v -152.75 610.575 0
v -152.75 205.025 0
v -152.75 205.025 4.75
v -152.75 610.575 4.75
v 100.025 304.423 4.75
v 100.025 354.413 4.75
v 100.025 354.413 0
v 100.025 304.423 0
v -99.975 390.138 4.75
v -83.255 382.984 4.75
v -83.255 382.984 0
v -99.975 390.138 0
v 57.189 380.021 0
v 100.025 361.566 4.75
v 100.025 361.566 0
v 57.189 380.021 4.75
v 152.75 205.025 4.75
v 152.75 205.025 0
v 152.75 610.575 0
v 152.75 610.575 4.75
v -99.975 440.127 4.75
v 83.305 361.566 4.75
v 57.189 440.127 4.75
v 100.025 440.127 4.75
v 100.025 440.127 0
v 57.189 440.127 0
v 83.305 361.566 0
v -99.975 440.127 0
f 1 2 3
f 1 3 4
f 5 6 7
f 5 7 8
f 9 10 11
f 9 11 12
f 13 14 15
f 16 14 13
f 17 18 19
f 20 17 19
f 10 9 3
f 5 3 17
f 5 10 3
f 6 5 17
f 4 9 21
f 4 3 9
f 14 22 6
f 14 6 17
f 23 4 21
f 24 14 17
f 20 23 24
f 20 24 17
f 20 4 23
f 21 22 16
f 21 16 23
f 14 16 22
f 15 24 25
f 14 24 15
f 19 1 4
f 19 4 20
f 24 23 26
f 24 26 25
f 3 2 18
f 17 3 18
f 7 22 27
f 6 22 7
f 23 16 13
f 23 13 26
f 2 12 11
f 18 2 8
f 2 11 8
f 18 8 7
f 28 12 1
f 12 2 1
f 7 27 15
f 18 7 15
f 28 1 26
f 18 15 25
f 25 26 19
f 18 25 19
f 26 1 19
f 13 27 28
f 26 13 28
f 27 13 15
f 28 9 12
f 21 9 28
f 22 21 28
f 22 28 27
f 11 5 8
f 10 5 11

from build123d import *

# Parameters (mm, degrees)
SKETCH_1_W                     = 305.5
SKETCH_1_H                     = 1221.15
EXTRUDE_1_DEPTH                = 4.75
CUT_EXTRUDE_2_DEPTH            = 4.75
SPLIT_BODIES_1_SURFACE_1_BACK  = 1259.793
SPLIT_BODIES_1_SURFACE_1_DEPTH = 2519.586


with BuildPart() as part:
    # 草圖1 → 填料-伸長1 (new body)
    with BuildSketch(Plane.XY):
        Rectangle(SKETCH_1_W, SKETCH_1_H)
    extrude(amount=EXTRUDE_1_DEPTH)

    # 草圖2 → 除料-伸長2 (cut)
    with BuildSketch(Plane.XY.offset(4.75)):
        Polygon((100.025, 354.412698413), (100.025, 304.423280423), (-83.25542328, 382.984126984), (-99.975, 390.137566138), (-99.975, 440.126984127), (83.30542328, 361.566137566), align=None)
        Polygon((57.189021164, 380.021164021), (57.189021164, 440.126984127), (100.025, 440.126984127), (100.025, 361.566137566), align=None)
        Polygon((50.035582011, 106.53968254), (57.189021164, 106.53968254), (57.189021164, 120.846560847), (100.025, 120.846560847), (100.025, 84.994708995), (71.453571429, 56.55026455), (50.035582011, 56.55026455), align=None)
        Polygon((-71.403571429, 56.55026455), (-99.975, 84.994708995), (-99.975, 120.846560847), (-57.096693122, 120.846560847), (-57.096693122, 106.53968254), (-21.414153439, 106.53968254), (-21.414153439, 120.846560847), (21.464153439, 120.846560847), (21.464153439, 85.121693122), (-7.107275132, 56.55026455), align=None)
        Polygon((-21.414153439, 142.264550265), (-57.096693122, 142.264550265), (-57.096693122, 127.830687831), (-99.975, 128), (-99.975, 163.682539683), (-71.403571429, 192.423280423), (71.453571429, 192.253968254), (100.025, 163.682539683), (100.025, 127.830687831), (57.189021164, 127.830687831), (57.189021164, 142.264550265), (21.464153439, 142.264550265), (21.464153439, 128), (-21.414153439, 128), align=None)
        Polygon((21.591137566, -141.164021164), (57.189021164, -141.164021164), (57.189021164, -127.026455026), (100.025, -127.026455026), (100.025, -162.878306878), (71.453571429, -191.322751323), (7.157275132, -191.322751323), (0.046164021, -184.042328042), (-6.980291005, -191.44973545), (-71.276587302, -191.44973545), (-99.848015873, -163.047619048), (-99.975, -127.026455026), (-57.096693122, -127.026455026), (-56.969708995, -141.333333333), (-21.24484127, -141.333333333), (-21.414153439, -127.026455026), (21.29484127, -126.899470899), (21.29484127, -127.153439153), (21.591137566, -127.153439153), align=None)
        Polygon((50.035582011, -55.44973545), (71.453571429, -55.44973545), (100.025, -84.19047619), (100.025, -120.042328042), (57.189021164, -120.042328042), (57.189021164, -105.608465608), (50.035582011, -105.608465608), align=None)
        Polygon((-49.985582011, -105.608465608), (-57.096693122, -105.608465608), (-57.096693122, -120.042328042), (-99.975, -119.873015873), (-99.975, -84.19047619), (-71.403571429, -55.44973545), (-49.985582011, -55.44973545), align=None)
        Polygon((50.035582011, -389.206349206), (57.189021164, -389.206349206), (57.189021164, -374.899470899), (100.025, -374.899470899), (100.025, -410.751322751), (71.453571429, -439.195767196), (50.035582011, -439.195767196), align=None)
        Polygon((-71.403571429, -439.195767196), (-99.975, -410.751322751), (-99.975, -374.899470899), (-57.096693122, -374.899470899), (-57.096693122, -389.206349206), (-21.414153439, -389.206349206), (-21.414153439, -374.899470899), (21.464153439, -374.899470899), (21.464153439, -410.624338624), (-7.107275132, -439.195767196), align=None)
        Polygon((-21.414153439, -353.481481481), (-57.096693122, -353.481481481), (-57.096693122, -367.915343915), (-99.975, -367.746031746), (-99.975, -332.063492063), (-71.403571429, -303.322751323), (71.453571429, -303.492063492), (100.025, -332.063492063), (100.025, -367.915343915), (57.189021164, -367.915343915), (57.189021164, -353.481481481), (21.464153439, -353.481481481), (21.464153439, -367.746031746), (-21.414153439, -367.746031746), align=None)
    extrude(amount=-CUT_EXTRUDE_2_DEPTH, mode=Mode.SUBTRACT)

    # Split Bodies 1: cut with a surface, the side it looks to stays
    # Split Bodies 1 surface: a surface, the sketch's curves swept straight by 2519.586 mm
    with BuildLine(Plane.XY.offset(4.75).offset(-SPLIT_BODIES_1_SURFACE_1_BACK), mode=Mode.PRIVATE) as split_bodies_1_surface_1_path:
        Line((-152.75, 205.025), (152.75, 205.025))
    split_bodies_1_surface_1 = Shell.extrude(split_bodies_1_surface_1_path.wire(), (0 * SPLIT_BODIES_1_SURFACE_1_DEPTH, 0 * SPLIT_BODIES_1_SURFACE_1_DEPTH, 1 * SPLIT_BODIES_1_SURFACE_1_DEPTH))
    split(bisect_by=split_bodies_1_surface_1, keep=Keep.TOP)


solid = part.part
